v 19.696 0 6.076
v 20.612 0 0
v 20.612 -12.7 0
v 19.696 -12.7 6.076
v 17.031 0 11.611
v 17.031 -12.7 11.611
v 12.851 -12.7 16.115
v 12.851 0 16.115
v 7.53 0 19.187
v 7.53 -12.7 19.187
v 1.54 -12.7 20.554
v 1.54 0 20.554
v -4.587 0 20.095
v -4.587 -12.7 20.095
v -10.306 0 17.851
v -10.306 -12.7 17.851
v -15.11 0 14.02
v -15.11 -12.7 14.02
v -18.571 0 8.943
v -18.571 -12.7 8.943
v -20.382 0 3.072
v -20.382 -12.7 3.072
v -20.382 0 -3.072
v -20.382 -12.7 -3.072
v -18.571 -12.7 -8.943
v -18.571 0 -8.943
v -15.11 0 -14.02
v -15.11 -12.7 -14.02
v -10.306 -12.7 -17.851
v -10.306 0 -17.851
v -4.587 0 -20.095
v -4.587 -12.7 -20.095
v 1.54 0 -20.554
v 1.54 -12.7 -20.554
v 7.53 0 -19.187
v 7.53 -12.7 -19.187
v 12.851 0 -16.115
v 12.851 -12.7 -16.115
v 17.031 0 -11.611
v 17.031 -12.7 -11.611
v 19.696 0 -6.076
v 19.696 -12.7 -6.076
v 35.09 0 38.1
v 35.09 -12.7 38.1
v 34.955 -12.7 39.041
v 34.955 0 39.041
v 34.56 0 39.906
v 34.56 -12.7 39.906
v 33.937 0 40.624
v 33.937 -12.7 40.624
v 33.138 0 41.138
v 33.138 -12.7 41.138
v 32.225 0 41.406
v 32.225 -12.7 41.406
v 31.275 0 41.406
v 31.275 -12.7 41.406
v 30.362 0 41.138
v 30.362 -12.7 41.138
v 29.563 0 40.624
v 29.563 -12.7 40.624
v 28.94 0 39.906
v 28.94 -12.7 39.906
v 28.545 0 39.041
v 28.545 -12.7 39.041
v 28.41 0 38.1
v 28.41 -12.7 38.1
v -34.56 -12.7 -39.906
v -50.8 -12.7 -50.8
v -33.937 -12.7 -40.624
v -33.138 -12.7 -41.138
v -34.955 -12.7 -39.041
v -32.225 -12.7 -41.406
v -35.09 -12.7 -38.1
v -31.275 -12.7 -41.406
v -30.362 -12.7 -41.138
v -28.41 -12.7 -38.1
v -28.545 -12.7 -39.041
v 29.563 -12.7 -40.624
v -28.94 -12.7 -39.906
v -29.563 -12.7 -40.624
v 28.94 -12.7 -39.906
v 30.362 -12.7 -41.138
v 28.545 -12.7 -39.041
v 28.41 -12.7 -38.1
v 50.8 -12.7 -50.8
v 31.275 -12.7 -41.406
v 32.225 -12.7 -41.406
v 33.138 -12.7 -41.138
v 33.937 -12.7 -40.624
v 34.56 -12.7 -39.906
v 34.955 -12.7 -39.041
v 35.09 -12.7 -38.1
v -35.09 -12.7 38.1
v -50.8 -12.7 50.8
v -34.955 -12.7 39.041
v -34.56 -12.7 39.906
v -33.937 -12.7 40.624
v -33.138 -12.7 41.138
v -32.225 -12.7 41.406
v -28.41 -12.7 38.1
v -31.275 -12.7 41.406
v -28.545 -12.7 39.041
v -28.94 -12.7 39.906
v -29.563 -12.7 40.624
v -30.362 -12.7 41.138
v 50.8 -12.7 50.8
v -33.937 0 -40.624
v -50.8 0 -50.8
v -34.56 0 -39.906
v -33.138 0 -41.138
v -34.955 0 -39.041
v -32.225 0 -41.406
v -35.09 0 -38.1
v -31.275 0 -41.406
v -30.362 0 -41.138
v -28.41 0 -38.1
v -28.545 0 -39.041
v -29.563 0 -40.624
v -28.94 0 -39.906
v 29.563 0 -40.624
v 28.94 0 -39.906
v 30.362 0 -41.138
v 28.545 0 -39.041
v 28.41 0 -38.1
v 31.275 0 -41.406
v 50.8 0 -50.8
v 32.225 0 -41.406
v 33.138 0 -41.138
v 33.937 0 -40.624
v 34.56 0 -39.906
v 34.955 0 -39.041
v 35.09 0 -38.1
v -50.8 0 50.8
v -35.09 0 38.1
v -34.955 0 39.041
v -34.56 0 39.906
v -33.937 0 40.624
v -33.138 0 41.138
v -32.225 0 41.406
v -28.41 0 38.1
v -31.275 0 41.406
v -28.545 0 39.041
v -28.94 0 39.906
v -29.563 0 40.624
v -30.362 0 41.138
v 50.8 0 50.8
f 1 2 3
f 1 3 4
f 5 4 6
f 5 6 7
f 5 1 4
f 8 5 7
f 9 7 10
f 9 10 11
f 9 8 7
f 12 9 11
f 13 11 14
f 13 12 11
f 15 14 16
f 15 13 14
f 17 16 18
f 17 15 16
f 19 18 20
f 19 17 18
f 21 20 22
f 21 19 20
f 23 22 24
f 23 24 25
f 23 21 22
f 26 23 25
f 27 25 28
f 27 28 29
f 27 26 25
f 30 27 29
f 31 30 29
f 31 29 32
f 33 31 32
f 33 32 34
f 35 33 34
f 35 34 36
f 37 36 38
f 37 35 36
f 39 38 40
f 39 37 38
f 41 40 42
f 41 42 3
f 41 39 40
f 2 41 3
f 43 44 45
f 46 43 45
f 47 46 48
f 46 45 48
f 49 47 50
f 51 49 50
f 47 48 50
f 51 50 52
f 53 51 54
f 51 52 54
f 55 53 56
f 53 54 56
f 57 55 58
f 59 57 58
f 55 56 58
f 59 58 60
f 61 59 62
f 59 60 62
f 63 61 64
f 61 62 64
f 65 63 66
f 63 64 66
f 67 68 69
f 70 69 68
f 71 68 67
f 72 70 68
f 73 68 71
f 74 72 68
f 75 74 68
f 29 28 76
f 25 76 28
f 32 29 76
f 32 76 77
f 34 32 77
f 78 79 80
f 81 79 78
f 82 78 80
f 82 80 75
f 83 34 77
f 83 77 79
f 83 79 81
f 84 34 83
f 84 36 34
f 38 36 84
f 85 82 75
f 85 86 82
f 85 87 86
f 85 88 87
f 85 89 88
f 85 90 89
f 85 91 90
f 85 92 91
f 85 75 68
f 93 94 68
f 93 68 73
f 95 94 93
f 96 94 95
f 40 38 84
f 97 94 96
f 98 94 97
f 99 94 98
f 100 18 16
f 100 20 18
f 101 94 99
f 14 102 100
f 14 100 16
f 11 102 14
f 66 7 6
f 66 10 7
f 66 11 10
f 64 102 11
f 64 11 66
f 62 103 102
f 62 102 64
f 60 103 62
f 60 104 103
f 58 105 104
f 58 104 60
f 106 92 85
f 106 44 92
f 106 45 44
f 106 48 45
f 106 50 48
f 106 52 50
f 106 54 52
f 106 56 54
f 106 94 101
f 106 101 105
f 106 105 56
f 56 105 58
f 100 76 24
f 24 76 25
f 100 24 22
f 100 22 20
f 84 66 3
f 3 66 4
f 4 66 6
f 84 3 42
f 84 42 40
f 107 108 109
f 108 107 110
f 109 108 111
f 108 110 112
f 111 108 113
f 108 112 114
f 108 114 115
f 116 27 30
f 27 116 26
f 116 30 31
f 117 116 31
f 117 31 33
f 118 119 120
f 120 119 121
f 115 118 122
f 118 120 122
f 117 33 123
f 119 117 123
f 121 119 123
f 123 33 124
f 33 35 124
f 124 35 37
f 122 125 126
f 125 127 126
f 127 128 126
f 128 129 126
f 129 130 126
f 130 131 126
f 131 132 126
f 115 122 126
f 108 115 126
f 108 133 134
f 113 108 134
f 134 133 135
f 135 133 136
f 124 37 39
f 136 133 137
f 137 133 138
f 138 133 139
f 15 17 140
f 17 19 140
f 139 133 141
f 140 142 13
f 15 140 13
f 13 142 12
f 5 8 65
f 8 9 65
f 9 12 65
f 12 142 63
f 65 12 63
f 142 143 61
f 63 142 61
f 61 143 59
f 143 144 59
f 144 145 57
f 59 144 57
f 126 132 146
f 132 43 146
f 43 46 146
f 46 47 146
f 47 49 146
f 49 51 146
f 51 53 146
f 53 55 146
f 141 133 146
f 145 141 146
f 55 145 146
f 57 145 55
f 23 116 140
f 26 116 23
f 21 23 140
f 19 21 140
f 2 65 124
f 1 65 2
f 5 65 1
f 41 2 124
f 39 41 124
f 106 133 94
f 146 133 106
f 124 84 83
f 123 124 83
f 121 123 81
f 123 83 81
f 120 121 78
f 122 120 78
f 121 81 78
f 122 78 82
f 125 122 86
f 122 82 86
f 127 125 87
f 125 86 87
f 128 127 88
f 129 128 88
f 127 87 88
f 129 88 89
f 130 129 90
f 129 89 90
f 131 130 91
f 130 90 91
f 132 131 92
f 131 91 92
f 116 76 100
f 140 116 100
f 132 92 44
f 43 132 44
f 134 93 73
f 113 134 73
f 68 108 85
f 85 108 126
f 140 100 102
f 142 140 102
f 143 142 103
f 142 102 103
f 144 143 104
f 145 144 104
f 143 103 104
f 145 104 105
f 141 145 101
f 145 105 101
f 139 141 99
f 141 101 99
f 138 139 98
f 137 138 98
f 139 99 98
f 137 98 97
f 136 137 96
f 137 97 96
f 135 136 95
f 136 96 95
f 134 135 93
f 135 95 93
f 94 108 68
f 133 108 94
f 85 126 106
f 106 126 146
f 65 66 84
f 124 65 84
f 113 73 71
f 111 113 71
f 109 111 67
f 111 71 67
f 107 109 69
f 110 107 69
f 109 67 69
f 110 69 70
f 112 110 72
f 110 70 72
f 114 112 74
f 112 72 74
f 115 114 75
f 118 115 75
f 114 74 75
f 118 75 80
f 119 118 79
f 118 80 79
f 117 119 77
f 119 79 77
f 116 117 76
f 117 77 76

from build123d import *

# Parameters (mm, degrees)
F0_W     = 101.6
F0_H     = 101.6
F0_R     = 20.6121
F1_DEPTH = 12.7
F3_DEPTH = 12.701


with BuildPart() as f1:
    # F0 (on Front) → F1 (new body)
    with BuildSketch(Plane.XZ):
        Rectangle(F0_W, F0_H)
        Circle(F0_R, mode=Mode.SUBTRACT)
    extrude(amount=F1_DEPTH)

    # F2 (on face) → F3 (cut, through all)
    with BuildSketch(Plane.XZ.offset(12.7)):
        with BuildLine():
            Line((35.0901, -38.1), (35.0901, 38.1))
            ThreePointArc((35.0901, 38.1), (31.75, 41.4401), (28.4099, 38.1))
            Line((28.4099, 38.1), (28.4099, -38.1))
            ThreePointArc((28.4099, -38.1), (31.75, -41.4401), (35.0901, -38.1))
        make_face()
        with BuildLine():
            Line((-28.4099, -38.1), (-28.4099, 38.1))
            ThreePointArc((-28.4099, 38.1), (-31.75, 41.4401), (-35.0901, 38.1))
            Line((-35.0901, 38.1), (-35.0901, -38.1))
            ThreePointArc((-35.0901, -38.1), (-31.75, -41.4401), (-28.4099, -38.1))
        make_face()
    extrude(amount=-F3_DEPTH, mode=Mode.SUBTRACT)


solid = f1.part
